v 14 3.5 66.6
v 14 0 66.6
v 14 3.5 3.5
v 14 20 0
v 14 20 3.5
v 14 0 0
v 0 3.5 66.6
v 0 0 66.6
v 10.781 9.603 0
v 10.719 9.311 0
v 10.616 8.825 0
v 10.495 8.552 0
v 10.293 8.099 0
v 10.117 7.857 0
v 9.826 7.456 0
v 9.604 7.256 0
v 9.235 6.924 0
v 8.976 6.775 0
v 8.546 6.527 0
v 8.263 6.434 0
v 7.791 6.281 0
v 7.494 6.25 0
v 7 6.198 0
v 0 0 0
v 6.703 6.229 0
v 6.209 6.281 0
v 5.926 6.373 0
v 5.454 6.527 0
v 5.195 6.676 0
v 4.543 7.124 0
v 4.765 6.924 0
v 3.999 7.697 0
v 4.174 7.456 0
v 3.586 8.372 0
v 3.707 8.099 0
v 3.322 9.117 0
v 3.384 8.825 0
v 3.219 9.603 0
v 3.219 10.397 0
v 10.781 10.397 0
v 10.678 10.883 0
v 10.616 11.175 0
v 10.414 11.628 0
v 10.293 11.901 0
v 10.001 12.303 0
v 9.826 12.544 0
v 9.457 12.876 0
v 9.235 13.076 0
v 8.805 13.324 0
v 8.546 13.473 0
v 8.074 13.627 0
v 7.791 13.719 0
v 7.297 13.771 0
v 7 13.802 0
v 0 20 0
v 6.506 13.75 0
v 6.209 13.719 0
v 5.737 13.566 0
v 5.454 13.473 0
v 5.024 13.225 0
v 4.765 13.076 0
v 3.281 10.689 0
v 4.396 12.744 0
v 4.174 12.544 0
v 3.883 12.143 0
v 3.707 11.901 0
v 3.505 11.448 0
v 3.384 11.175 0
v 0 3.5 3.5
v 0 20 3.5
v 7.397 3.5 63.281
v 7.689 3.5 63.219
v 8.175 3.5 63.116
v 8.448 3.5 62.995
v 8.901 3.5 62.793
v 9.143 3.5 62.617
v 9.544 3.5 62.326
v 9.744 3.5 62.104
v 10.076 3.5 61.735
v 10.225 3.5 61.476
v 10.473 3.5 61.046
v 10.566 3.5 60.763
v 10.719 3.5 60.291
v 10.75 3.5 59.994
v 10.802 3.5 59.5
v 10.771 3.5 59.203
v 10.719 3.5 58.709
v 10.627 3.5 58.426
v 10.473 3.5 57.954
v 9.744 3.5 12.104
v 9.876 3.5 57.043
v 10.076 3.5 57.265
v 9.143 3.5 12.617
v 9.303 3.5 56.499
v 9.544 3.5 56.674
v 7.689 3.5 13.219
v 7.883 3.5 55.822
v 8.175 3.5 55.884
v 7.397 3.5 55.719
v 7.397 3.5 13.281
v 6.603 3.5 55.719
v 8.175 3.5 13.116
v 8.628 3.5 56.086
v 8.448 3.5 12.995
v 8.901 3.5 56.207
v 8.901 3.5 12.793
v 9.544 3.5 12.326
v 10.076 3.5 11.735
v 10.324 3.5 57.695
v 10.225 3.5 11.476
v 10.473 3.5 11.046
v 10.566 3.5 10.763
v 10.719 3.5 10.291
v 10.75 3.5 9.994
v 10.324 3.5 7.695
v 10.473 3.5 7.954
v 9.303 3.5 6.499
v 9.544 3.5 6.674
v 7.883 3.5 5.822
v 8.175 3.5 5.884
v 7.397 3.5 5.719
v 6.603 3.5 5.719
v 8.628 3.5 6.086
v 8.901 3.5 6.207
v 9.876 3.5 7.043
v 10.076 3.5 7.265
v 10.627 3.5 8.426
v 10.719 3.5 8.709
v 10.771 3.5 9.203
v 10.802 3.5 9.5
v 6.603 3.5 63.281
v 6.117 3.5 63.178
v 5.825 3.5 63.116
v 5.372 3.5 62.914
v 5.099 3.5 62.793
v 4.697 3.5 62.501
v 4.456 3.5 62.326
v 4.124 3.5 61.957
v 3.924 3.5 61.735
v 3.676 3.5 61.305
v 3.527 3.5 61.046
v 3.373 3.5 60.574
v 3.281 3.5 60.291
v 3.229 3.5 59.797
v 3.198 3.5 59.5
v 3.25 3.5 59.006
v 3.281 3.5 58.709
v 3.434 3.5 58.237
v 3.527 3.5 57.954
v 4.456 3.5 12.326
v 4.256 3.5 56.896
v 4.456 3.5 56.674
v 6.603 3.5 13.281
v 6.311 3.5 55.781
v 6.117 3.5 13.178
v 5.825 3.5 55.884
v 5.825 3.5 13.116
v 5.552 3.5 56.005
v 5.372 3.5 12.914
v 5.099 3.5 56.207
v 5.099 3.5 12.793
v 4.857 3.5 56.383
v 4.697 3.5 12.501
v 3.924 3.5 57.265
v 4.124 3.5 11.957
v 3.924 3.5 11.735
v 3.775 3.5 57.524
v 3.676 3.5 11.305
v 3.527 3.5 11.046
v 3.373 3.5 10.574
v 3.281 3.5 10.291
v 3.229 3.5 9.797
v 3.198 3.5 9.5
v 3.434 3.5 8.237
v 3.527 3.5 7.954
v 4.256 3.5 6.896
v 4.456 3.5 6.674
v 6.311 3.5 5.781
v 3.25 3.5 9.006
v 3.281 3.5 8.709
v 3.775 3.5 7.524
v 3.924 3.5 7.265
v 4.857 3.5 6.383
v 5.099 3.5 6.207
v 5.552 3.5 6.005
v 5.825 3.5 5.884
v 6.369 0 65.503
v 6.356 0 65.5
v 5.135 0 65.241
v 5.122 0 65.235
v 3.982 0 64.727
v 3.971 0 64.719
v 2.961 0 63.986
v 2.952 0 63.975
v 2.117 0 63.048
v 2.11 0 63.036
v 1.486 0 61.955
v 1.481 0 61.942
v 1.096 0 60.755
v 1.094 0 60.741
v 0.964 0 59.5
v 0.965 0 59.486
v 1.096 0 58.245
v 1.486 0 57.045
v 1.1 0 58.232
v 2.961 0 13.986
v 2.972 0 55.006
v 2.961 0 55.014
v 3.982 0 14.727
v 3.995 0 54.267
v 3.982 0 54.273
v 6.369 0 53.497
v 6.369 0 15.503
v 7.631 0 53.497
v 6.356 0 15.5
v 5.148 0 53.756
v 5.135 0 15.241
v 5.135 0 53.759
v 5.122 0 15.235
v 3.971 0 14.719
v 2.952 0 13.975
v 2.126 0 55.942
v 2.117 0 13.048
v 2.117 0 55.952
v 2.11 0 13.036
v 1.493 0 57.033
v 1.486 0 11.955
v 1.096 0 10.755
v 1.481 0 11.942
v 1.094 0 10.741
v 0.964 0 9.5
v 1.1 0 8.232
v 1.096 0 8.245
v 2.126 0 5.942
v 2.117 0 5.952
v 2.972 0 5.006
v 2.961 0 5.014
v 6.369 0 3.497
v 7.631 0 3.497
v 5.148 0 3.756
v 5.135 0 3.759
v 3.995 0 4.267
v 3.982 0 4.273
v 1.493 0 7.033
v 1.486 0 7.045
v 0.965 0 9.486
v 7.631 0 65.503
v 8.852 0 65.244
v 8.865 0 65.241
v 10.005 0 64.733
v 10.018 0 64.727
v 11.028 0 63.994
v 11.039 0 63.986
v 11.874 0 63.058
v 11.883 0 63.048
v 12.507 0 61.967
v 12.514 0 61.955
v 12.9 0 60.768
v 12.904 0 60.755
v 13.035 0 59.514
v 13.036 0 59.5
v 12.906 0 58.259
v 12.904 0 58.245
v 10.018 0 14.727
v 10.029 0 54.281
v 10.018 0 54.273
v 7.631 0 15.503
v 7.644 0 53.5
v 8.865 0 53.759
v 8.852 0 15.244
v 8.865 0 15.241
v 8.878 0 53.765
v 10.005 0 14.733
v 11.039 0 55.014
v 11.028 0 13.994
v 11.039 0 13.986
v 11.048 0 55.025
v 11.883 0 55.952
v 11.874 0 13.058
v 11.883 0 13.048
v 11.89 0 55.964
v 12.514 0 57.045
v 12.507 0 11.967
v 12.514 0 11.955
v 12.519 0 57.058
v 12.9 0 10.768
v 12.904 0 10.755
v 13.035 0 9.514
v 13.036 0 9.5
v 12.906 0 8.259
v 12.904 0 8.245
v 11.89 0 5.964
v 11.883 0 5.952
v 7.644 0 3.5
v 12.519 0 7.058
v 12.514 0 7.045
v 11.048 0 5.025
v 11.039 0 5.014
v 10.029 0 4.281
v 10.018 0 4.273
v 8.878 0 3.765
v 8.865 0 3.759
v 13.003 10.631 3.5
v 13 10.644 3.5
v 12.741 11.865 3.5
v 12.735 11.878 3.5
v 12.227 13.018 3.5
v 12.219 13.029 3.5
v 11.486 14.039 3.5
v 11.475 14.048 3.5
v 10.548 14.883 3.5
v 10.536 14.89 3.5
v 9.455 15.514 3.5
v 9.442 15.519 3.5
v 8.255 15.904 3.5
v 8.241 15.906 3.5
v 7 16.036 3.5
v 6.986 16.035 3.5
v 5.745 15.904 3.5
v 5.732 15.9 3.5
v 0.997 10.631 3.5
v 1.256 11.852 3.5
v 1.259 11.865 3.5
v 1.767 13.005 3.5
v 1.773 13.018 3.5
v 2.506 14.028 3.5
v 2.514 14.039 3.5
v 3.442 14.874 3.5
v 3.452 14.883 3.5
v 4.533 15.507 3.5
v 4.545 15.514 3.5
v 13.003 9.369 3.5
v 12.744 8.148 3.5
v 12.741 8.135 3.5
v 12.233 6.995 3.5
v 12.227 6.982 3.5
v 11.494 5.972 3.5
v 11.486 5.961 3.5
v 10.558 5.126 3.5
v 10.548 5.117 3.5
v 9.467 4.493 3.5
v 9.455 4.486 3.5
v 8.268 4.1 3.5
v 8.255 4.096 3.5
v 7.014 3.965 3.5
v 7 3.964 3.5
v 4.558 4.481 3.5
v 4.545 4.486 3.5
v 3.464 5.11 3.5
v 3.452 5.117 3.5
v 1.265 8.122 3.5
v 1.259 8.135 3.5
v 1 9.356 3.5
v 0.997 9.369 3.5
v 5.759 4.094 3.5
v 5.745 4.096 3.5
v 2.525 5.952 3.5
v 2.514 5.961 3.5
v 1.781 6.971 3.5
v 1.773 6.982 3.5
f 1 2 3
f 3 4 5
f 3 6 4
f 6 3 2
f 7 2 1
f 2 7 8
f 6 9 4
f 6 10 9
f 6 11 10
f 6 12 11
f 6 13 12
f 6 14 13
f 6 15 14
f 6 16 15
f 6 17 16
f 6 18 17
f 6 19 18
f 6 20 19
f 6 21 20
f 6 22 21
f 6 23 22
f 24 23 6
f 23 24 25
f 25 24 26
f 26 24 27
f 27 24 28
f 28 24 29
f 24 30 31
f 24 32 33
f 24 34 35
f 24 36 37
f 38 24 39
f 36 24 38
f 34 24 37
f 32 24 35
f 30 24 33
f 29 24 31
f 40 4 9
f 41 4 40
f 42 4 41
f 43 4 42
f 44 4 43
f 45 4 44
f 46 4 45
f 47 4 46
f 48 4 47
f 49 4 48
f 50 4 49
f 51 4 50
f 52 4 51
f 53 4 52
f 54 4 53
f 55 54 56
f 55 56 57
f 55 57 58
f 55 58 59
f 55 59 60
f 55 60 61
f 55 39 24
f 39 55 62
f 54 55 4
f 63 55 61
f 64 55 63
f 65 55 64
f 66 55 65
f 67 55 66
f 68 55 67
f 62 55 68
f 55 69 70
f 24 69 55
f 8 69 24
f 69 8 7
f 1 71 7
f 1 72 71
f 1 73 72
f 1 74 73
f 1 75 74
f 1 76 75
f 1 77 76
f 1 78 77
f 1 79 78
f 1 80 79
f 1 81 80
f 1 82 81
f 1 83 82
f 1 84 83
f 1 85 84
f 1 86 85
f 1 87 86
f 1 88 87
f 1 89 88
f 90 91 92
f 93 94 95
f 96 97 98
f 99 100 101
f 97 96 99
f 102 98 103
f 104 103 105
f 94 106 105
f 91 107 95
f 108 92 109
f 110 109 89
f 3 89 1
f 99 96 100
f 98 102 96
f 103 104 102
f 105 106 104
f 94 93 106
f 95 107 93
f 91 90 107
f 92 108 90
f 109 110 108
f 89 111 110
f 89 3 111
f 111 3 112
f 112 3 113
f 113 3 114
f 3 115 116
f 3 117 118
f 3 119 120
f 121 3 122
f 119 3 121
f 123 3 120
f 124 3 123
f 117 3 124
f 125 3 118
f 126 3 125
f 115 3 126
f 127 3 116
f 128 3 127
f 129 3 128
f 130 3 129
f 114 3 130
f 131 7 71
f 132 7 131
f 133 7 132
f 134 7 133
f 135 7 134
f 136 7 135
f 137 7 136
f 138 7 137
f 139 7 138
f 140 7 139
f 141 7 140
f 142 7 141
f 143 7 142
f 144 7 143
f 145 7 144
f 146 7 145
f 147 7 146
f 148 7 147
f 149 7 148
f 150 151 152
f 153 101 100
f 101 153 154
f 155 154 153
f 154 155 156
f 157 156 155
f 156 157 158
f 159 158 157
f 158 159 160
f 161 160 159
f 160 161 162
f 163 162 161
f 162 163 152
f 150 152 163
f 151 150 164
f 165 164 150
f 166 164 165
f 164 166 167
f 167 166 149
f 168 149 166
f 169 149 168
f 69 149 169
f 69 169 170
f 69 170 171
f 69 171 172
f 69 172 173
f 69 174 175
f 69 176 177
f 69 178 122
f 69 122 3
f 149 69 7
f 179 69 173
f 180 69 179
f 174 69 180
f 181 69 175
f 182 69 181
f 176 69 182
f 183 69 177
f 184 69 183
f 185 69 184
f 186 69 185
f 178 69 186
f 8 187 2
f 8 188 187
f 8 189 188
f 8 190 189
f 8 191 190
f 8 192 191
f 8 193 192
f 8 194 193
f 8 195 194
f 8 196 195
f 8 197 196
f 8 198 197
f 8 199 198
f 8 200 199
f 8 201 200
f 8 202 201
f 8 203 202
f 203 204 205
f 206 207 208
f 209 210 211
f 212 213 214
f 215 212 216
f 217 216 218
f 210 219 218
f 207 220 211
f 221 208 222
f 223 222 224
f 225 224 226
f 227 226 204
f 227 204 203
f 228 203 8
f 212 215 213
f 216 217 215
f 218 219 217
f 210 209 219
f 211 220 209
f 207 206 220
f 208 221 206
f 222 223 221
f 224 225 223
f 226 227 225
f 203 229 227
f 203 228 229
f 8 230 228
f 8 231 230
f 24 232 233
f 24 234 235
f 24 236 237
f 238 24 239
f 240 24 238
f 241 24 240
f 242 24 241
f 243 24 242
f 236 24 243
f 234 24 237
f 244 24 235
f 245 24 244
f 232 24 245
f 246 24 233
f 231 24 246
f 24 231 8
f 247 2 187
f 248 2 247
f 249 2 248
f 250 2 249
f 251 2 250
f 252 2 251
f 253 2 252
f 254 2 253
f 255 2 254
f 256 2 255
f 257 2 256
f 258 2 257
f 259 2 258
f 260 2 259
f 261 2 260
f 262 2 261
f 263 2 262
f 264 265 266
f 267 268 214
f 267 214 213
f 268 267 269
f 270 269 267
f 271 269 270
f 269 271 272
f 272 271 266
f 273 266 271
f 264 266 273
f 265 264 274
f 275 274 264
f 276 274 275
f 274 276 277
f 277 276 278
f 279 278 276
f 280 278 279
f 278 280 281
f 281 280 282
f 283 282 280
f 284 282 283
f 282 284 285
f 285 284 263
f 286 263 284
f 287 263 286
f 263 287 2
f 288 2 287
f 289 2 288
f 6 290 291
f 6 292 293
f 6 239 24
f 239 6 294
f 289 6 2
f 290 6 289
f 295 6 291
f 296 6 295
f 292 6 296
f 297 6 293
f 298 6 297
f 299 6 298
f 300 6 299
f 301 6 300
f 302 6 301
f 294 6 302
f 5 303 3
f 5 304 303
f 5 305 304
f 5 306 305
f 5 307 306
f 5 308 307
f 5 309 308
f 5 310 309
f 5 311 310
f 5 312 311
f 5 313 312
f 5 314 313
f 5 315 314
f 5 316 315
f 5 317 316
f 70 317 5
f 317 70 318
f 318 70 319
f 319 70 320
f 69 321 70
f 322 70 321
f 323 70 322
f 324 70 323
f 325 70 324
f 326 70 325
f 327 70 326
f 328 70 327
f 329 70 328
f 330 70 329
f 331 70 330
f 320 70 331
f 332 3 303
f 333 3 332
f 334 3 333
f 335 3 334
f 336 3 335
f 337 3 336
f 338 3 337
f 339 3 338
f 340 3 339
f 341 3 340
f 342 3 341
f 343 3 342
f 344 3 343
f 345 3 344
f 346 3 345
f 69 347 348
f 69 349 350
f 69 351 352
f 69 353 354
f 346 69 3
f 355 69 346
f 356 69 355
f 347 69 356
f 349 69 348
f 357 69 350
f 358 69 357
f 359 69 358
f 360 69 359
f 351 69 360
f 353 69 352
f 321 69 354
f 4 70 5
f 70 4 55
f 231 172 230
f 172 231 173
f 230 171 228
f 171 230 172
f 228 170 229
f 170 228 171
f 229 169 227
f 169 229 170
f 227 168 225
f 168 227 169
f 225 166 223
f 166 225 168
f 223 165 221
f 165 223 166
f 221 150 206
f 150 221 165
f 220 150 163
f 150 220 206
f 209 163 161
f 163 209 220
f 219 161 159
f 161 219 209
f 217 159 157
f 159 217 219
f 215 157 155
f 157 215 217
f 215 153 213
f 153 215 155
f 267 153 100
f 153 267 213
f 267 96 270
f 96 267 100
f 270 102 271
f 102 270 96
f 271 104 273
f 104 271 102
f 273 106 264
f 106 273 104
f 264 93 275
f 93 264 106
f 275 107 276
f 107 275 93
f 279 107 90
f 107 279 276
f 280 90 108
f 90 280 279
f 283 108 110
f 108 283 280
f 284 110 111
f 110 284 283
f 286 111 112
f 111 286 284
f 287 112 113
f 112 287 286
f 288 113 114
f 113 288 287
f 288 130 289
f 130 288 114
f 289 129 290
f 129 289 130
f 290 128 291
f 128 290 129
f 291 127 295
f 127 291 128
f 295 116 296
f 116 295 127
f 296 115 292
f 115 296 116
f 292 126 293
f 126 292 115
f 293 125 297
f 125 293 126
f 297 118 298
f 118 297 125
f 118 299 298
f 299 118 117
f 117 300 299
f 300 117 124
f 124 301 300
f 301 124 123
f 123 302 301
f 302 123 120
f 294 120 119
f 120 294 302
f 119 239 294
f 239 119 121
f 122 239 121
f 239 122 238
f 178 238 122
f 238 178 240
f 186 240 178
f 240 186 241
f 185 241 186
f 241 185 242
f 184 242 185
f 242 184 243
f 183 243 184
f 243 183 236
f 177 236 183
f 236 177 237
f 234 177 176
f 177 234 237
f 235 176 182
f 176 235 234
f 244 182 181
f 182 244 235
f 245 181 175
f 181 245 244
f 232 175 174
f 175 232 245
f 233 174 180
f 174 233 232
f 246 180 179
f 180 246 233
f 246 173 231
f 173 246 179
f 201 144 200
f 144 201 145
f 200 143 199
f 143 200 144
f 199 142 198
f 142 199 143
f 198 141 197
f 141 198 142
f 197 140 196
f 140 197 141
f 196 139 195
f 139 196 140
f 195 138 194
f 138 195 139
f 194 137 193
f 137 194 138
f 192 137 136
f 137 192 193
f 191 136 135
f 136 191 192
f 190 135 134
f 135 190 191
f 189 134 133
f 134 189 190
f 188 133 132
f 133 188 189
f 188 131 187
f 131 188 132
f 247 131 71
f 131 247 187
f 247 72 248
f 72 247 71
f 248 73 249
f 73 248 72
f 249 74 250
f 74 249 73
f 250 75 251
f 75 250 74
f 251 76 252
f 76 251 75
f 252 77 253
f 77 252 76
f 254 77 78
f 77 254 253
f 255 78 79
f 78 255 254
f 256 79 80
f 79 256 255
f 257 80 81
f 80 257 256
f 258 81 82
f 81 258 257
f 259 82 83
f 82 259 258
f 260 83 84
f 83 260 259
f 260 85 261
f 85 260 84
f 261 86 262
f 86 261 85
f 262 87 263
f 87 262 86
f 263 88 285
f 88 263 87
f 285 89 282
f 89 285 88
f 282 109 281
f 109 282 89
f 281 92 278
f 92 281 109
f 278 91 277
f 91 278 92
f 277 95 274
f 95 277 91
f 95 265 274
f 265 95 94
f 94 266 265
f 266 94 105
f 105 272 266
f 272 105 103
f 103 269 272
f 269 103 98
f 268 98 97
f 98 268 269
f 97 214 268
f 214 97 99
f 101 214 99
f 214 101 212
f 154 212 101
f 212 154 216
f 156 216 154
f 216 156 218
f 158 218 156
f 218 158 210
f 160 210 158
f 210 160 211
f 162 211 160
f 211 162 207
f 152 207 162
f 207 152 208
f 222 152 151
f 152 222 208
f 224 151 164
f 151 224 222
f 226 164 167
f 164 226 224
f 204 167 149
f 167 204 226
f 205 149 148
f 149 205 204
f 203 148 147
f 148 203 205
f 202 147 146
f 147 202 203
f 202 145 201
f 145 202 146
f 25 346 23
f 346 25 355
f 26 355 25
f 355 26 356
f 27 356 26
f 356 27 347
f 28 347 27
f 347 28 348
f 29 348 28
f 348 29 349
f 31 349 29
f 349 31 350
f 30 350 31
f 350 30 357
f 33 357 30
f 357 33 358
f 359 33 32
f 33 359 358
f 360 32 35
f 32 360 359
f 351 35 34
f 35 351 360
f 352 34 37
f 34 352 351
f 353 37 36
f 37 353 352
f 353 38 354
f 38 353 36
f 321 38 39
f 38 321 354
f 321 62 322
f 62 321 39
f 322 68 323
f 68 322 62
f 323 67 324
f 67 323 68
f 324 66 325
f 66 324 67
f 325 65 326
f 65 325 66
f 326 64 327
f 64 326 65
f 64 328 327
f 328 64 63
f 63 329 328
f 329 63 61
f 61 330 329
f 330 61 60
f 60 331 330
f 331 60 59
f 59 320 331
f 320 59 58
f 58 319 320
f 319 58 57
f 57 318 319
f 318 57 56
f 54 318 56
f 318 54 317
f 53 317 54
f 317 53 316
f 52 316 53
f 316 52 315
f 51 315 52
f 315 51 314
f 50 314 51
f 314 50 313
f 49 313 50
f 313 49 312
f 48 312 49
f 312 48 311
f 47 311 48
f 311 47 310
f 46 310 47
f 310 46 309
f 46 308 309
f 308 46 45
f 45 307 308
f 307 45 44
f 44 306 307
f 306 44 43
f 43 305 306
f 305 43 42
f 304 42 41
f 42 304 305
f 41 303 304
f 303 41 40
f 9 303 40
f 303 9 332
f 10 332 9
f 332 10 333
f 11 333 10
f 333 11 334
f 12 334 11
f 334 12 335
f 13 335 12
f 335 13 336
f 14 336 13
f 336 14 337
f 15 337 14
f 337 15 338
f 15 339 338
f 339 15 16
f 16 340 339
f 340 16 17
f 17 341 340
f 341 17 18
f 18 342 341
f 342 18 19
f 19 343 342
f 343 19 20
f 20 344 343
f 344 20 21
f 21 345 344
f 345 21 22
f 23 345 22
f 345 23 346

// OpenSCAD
// file: Parts/Screw.scad
// created by IndiePandaaaaa | Lukas

function cone_diameter(diameter) = diameter * 2;

function cone_height(diameter) = diameter * 0.75;

module screw(diameter, length, cutout_sample = false, fs = 0.1, fa = 1) {
    //$fs = 0.1; [size in mm] | $fa = 1; [degrees]
    //$fn = 100; [defined faces]

    module base_model(diameter, length, cone_height, cone_diameter, offset = 0, fs = 0.1, fa = 1) {
        rotate_extrude($fs = fs) {
            polygon([
                    [0, 0],
                    [(diameter + offset) / 2, 0],
                    [(diameter + offset) / 2, (length + offset) - (cone_height + offset)],
                    [(cone_diameter + offset) / 2, length + offset],
                    [0, length + offset],
                ]);
        }
    }

    if (length < diameter) {
        echo("Screw is too short");
        length = diameter + 1;
        echo("New length is: ", length);
    }

    if (!cutout_sample) {
        translate([0, 0, - length])
            difference() {
                base_model(diameter, length, cone_height(diameter), cone_diameter(diameter));

                // top cross part
                translate([0, 0, length + 0.1 - (cone_height(diameter) - diameter / 2)])
                    difference() {
                        rotate([0, 0, 45])
                            rotate_extrude($fn = 4) {
                                polygon([
                                        [0, 0],
                                        [diameter * 1.4 / 2, 0],
                                        [cone_diameter(diameter) / 2, cone_height(diameter) - diameter / 2],
                                        [0, cone_height(diameter) - diameter / 2],
                                    ]);
                            }
                        for (i = [0 : 1 : 3]) {
                            rotate([0, 0, 90 * i])
                                translate([diameter / 3.18 / 2, diameter / 3.18 / 2, - 0.1])
                                    cube(cone_height(diameter) + 0.2);
                        }
                    }
            }
    } else {
        offset = 0.2;
        translate([0, 0, - length - offset / 2])
            base_model(diameter, length, cone_height(diameter), cone_diameter(diameter), offset);
    }
}

screw(3.5, 12);
// main file
// created by IndiePandaaaaa | Lukas

use <Parts/Screw.scad>

MODEL_TOLERANCE = 0.1;
MODEL_THICKNESS = 3.5;
FN = 42;

SOCKET_WIDTH = 14;
PLATE_DEPTH = 63;  // Bremounta 58mm
PLATE_SCREW_OD = 6;

BREMOUNTA_SCREW_DIST = 50;
BREMOUNTA_SCREW_OD = 6;
BREMOUNTA_SCREW_HOLE_ID = 6.5;
BREMOUNTA_SCREW_HOLE_OD = BREMOUNTA_SCREW_HOLE_ID + 1;
BREMOUNTA_SCREW_HOLE_OD_DEPTH = 1;

WOOD_SCREWIN_THICKNESS = 20;

difference() {
    union() {
        cube([SOCKET_WIDTH, MODEL_THICKNESS, PLATE_DEPTH + MODEL_TOLERANCE + MODEL_THICKNESS]);
        cube([SOCKET_WIDTH, WOOD_SCREWIN_THICKNESS, MODEL_THICKNESS]);
    }
    translate([SOCKET_WIDTH / 2, WOOD_SCREWIN_THICKNESS / 2, MODEL_THICKNESS])
        rotate([0, 0, 90]) screw(PLATE_SCREW_OD, 12, true);

    for (i = [0:1]) {
        translate([SOCKET_WIDTH / 2, 0, BREMOUNTA_SCREW_OD + MODEL_THICKNESS + BREMOUNTA_SCREW_DIST * i]) {
            rotate([90, 0, 0]) {
                screw(BREMOUNTA_SCREW_OD, 12, true);
                translate([0, 0, - MODEL_THICKNESS])
                    cylinder(d = BREMOUNTA_SCREW_HOLE_OD, h = BREMOUNTA_SCREW_HOLE_OD_DEPTH, $fn = FN);
            }
        }
    }
}
